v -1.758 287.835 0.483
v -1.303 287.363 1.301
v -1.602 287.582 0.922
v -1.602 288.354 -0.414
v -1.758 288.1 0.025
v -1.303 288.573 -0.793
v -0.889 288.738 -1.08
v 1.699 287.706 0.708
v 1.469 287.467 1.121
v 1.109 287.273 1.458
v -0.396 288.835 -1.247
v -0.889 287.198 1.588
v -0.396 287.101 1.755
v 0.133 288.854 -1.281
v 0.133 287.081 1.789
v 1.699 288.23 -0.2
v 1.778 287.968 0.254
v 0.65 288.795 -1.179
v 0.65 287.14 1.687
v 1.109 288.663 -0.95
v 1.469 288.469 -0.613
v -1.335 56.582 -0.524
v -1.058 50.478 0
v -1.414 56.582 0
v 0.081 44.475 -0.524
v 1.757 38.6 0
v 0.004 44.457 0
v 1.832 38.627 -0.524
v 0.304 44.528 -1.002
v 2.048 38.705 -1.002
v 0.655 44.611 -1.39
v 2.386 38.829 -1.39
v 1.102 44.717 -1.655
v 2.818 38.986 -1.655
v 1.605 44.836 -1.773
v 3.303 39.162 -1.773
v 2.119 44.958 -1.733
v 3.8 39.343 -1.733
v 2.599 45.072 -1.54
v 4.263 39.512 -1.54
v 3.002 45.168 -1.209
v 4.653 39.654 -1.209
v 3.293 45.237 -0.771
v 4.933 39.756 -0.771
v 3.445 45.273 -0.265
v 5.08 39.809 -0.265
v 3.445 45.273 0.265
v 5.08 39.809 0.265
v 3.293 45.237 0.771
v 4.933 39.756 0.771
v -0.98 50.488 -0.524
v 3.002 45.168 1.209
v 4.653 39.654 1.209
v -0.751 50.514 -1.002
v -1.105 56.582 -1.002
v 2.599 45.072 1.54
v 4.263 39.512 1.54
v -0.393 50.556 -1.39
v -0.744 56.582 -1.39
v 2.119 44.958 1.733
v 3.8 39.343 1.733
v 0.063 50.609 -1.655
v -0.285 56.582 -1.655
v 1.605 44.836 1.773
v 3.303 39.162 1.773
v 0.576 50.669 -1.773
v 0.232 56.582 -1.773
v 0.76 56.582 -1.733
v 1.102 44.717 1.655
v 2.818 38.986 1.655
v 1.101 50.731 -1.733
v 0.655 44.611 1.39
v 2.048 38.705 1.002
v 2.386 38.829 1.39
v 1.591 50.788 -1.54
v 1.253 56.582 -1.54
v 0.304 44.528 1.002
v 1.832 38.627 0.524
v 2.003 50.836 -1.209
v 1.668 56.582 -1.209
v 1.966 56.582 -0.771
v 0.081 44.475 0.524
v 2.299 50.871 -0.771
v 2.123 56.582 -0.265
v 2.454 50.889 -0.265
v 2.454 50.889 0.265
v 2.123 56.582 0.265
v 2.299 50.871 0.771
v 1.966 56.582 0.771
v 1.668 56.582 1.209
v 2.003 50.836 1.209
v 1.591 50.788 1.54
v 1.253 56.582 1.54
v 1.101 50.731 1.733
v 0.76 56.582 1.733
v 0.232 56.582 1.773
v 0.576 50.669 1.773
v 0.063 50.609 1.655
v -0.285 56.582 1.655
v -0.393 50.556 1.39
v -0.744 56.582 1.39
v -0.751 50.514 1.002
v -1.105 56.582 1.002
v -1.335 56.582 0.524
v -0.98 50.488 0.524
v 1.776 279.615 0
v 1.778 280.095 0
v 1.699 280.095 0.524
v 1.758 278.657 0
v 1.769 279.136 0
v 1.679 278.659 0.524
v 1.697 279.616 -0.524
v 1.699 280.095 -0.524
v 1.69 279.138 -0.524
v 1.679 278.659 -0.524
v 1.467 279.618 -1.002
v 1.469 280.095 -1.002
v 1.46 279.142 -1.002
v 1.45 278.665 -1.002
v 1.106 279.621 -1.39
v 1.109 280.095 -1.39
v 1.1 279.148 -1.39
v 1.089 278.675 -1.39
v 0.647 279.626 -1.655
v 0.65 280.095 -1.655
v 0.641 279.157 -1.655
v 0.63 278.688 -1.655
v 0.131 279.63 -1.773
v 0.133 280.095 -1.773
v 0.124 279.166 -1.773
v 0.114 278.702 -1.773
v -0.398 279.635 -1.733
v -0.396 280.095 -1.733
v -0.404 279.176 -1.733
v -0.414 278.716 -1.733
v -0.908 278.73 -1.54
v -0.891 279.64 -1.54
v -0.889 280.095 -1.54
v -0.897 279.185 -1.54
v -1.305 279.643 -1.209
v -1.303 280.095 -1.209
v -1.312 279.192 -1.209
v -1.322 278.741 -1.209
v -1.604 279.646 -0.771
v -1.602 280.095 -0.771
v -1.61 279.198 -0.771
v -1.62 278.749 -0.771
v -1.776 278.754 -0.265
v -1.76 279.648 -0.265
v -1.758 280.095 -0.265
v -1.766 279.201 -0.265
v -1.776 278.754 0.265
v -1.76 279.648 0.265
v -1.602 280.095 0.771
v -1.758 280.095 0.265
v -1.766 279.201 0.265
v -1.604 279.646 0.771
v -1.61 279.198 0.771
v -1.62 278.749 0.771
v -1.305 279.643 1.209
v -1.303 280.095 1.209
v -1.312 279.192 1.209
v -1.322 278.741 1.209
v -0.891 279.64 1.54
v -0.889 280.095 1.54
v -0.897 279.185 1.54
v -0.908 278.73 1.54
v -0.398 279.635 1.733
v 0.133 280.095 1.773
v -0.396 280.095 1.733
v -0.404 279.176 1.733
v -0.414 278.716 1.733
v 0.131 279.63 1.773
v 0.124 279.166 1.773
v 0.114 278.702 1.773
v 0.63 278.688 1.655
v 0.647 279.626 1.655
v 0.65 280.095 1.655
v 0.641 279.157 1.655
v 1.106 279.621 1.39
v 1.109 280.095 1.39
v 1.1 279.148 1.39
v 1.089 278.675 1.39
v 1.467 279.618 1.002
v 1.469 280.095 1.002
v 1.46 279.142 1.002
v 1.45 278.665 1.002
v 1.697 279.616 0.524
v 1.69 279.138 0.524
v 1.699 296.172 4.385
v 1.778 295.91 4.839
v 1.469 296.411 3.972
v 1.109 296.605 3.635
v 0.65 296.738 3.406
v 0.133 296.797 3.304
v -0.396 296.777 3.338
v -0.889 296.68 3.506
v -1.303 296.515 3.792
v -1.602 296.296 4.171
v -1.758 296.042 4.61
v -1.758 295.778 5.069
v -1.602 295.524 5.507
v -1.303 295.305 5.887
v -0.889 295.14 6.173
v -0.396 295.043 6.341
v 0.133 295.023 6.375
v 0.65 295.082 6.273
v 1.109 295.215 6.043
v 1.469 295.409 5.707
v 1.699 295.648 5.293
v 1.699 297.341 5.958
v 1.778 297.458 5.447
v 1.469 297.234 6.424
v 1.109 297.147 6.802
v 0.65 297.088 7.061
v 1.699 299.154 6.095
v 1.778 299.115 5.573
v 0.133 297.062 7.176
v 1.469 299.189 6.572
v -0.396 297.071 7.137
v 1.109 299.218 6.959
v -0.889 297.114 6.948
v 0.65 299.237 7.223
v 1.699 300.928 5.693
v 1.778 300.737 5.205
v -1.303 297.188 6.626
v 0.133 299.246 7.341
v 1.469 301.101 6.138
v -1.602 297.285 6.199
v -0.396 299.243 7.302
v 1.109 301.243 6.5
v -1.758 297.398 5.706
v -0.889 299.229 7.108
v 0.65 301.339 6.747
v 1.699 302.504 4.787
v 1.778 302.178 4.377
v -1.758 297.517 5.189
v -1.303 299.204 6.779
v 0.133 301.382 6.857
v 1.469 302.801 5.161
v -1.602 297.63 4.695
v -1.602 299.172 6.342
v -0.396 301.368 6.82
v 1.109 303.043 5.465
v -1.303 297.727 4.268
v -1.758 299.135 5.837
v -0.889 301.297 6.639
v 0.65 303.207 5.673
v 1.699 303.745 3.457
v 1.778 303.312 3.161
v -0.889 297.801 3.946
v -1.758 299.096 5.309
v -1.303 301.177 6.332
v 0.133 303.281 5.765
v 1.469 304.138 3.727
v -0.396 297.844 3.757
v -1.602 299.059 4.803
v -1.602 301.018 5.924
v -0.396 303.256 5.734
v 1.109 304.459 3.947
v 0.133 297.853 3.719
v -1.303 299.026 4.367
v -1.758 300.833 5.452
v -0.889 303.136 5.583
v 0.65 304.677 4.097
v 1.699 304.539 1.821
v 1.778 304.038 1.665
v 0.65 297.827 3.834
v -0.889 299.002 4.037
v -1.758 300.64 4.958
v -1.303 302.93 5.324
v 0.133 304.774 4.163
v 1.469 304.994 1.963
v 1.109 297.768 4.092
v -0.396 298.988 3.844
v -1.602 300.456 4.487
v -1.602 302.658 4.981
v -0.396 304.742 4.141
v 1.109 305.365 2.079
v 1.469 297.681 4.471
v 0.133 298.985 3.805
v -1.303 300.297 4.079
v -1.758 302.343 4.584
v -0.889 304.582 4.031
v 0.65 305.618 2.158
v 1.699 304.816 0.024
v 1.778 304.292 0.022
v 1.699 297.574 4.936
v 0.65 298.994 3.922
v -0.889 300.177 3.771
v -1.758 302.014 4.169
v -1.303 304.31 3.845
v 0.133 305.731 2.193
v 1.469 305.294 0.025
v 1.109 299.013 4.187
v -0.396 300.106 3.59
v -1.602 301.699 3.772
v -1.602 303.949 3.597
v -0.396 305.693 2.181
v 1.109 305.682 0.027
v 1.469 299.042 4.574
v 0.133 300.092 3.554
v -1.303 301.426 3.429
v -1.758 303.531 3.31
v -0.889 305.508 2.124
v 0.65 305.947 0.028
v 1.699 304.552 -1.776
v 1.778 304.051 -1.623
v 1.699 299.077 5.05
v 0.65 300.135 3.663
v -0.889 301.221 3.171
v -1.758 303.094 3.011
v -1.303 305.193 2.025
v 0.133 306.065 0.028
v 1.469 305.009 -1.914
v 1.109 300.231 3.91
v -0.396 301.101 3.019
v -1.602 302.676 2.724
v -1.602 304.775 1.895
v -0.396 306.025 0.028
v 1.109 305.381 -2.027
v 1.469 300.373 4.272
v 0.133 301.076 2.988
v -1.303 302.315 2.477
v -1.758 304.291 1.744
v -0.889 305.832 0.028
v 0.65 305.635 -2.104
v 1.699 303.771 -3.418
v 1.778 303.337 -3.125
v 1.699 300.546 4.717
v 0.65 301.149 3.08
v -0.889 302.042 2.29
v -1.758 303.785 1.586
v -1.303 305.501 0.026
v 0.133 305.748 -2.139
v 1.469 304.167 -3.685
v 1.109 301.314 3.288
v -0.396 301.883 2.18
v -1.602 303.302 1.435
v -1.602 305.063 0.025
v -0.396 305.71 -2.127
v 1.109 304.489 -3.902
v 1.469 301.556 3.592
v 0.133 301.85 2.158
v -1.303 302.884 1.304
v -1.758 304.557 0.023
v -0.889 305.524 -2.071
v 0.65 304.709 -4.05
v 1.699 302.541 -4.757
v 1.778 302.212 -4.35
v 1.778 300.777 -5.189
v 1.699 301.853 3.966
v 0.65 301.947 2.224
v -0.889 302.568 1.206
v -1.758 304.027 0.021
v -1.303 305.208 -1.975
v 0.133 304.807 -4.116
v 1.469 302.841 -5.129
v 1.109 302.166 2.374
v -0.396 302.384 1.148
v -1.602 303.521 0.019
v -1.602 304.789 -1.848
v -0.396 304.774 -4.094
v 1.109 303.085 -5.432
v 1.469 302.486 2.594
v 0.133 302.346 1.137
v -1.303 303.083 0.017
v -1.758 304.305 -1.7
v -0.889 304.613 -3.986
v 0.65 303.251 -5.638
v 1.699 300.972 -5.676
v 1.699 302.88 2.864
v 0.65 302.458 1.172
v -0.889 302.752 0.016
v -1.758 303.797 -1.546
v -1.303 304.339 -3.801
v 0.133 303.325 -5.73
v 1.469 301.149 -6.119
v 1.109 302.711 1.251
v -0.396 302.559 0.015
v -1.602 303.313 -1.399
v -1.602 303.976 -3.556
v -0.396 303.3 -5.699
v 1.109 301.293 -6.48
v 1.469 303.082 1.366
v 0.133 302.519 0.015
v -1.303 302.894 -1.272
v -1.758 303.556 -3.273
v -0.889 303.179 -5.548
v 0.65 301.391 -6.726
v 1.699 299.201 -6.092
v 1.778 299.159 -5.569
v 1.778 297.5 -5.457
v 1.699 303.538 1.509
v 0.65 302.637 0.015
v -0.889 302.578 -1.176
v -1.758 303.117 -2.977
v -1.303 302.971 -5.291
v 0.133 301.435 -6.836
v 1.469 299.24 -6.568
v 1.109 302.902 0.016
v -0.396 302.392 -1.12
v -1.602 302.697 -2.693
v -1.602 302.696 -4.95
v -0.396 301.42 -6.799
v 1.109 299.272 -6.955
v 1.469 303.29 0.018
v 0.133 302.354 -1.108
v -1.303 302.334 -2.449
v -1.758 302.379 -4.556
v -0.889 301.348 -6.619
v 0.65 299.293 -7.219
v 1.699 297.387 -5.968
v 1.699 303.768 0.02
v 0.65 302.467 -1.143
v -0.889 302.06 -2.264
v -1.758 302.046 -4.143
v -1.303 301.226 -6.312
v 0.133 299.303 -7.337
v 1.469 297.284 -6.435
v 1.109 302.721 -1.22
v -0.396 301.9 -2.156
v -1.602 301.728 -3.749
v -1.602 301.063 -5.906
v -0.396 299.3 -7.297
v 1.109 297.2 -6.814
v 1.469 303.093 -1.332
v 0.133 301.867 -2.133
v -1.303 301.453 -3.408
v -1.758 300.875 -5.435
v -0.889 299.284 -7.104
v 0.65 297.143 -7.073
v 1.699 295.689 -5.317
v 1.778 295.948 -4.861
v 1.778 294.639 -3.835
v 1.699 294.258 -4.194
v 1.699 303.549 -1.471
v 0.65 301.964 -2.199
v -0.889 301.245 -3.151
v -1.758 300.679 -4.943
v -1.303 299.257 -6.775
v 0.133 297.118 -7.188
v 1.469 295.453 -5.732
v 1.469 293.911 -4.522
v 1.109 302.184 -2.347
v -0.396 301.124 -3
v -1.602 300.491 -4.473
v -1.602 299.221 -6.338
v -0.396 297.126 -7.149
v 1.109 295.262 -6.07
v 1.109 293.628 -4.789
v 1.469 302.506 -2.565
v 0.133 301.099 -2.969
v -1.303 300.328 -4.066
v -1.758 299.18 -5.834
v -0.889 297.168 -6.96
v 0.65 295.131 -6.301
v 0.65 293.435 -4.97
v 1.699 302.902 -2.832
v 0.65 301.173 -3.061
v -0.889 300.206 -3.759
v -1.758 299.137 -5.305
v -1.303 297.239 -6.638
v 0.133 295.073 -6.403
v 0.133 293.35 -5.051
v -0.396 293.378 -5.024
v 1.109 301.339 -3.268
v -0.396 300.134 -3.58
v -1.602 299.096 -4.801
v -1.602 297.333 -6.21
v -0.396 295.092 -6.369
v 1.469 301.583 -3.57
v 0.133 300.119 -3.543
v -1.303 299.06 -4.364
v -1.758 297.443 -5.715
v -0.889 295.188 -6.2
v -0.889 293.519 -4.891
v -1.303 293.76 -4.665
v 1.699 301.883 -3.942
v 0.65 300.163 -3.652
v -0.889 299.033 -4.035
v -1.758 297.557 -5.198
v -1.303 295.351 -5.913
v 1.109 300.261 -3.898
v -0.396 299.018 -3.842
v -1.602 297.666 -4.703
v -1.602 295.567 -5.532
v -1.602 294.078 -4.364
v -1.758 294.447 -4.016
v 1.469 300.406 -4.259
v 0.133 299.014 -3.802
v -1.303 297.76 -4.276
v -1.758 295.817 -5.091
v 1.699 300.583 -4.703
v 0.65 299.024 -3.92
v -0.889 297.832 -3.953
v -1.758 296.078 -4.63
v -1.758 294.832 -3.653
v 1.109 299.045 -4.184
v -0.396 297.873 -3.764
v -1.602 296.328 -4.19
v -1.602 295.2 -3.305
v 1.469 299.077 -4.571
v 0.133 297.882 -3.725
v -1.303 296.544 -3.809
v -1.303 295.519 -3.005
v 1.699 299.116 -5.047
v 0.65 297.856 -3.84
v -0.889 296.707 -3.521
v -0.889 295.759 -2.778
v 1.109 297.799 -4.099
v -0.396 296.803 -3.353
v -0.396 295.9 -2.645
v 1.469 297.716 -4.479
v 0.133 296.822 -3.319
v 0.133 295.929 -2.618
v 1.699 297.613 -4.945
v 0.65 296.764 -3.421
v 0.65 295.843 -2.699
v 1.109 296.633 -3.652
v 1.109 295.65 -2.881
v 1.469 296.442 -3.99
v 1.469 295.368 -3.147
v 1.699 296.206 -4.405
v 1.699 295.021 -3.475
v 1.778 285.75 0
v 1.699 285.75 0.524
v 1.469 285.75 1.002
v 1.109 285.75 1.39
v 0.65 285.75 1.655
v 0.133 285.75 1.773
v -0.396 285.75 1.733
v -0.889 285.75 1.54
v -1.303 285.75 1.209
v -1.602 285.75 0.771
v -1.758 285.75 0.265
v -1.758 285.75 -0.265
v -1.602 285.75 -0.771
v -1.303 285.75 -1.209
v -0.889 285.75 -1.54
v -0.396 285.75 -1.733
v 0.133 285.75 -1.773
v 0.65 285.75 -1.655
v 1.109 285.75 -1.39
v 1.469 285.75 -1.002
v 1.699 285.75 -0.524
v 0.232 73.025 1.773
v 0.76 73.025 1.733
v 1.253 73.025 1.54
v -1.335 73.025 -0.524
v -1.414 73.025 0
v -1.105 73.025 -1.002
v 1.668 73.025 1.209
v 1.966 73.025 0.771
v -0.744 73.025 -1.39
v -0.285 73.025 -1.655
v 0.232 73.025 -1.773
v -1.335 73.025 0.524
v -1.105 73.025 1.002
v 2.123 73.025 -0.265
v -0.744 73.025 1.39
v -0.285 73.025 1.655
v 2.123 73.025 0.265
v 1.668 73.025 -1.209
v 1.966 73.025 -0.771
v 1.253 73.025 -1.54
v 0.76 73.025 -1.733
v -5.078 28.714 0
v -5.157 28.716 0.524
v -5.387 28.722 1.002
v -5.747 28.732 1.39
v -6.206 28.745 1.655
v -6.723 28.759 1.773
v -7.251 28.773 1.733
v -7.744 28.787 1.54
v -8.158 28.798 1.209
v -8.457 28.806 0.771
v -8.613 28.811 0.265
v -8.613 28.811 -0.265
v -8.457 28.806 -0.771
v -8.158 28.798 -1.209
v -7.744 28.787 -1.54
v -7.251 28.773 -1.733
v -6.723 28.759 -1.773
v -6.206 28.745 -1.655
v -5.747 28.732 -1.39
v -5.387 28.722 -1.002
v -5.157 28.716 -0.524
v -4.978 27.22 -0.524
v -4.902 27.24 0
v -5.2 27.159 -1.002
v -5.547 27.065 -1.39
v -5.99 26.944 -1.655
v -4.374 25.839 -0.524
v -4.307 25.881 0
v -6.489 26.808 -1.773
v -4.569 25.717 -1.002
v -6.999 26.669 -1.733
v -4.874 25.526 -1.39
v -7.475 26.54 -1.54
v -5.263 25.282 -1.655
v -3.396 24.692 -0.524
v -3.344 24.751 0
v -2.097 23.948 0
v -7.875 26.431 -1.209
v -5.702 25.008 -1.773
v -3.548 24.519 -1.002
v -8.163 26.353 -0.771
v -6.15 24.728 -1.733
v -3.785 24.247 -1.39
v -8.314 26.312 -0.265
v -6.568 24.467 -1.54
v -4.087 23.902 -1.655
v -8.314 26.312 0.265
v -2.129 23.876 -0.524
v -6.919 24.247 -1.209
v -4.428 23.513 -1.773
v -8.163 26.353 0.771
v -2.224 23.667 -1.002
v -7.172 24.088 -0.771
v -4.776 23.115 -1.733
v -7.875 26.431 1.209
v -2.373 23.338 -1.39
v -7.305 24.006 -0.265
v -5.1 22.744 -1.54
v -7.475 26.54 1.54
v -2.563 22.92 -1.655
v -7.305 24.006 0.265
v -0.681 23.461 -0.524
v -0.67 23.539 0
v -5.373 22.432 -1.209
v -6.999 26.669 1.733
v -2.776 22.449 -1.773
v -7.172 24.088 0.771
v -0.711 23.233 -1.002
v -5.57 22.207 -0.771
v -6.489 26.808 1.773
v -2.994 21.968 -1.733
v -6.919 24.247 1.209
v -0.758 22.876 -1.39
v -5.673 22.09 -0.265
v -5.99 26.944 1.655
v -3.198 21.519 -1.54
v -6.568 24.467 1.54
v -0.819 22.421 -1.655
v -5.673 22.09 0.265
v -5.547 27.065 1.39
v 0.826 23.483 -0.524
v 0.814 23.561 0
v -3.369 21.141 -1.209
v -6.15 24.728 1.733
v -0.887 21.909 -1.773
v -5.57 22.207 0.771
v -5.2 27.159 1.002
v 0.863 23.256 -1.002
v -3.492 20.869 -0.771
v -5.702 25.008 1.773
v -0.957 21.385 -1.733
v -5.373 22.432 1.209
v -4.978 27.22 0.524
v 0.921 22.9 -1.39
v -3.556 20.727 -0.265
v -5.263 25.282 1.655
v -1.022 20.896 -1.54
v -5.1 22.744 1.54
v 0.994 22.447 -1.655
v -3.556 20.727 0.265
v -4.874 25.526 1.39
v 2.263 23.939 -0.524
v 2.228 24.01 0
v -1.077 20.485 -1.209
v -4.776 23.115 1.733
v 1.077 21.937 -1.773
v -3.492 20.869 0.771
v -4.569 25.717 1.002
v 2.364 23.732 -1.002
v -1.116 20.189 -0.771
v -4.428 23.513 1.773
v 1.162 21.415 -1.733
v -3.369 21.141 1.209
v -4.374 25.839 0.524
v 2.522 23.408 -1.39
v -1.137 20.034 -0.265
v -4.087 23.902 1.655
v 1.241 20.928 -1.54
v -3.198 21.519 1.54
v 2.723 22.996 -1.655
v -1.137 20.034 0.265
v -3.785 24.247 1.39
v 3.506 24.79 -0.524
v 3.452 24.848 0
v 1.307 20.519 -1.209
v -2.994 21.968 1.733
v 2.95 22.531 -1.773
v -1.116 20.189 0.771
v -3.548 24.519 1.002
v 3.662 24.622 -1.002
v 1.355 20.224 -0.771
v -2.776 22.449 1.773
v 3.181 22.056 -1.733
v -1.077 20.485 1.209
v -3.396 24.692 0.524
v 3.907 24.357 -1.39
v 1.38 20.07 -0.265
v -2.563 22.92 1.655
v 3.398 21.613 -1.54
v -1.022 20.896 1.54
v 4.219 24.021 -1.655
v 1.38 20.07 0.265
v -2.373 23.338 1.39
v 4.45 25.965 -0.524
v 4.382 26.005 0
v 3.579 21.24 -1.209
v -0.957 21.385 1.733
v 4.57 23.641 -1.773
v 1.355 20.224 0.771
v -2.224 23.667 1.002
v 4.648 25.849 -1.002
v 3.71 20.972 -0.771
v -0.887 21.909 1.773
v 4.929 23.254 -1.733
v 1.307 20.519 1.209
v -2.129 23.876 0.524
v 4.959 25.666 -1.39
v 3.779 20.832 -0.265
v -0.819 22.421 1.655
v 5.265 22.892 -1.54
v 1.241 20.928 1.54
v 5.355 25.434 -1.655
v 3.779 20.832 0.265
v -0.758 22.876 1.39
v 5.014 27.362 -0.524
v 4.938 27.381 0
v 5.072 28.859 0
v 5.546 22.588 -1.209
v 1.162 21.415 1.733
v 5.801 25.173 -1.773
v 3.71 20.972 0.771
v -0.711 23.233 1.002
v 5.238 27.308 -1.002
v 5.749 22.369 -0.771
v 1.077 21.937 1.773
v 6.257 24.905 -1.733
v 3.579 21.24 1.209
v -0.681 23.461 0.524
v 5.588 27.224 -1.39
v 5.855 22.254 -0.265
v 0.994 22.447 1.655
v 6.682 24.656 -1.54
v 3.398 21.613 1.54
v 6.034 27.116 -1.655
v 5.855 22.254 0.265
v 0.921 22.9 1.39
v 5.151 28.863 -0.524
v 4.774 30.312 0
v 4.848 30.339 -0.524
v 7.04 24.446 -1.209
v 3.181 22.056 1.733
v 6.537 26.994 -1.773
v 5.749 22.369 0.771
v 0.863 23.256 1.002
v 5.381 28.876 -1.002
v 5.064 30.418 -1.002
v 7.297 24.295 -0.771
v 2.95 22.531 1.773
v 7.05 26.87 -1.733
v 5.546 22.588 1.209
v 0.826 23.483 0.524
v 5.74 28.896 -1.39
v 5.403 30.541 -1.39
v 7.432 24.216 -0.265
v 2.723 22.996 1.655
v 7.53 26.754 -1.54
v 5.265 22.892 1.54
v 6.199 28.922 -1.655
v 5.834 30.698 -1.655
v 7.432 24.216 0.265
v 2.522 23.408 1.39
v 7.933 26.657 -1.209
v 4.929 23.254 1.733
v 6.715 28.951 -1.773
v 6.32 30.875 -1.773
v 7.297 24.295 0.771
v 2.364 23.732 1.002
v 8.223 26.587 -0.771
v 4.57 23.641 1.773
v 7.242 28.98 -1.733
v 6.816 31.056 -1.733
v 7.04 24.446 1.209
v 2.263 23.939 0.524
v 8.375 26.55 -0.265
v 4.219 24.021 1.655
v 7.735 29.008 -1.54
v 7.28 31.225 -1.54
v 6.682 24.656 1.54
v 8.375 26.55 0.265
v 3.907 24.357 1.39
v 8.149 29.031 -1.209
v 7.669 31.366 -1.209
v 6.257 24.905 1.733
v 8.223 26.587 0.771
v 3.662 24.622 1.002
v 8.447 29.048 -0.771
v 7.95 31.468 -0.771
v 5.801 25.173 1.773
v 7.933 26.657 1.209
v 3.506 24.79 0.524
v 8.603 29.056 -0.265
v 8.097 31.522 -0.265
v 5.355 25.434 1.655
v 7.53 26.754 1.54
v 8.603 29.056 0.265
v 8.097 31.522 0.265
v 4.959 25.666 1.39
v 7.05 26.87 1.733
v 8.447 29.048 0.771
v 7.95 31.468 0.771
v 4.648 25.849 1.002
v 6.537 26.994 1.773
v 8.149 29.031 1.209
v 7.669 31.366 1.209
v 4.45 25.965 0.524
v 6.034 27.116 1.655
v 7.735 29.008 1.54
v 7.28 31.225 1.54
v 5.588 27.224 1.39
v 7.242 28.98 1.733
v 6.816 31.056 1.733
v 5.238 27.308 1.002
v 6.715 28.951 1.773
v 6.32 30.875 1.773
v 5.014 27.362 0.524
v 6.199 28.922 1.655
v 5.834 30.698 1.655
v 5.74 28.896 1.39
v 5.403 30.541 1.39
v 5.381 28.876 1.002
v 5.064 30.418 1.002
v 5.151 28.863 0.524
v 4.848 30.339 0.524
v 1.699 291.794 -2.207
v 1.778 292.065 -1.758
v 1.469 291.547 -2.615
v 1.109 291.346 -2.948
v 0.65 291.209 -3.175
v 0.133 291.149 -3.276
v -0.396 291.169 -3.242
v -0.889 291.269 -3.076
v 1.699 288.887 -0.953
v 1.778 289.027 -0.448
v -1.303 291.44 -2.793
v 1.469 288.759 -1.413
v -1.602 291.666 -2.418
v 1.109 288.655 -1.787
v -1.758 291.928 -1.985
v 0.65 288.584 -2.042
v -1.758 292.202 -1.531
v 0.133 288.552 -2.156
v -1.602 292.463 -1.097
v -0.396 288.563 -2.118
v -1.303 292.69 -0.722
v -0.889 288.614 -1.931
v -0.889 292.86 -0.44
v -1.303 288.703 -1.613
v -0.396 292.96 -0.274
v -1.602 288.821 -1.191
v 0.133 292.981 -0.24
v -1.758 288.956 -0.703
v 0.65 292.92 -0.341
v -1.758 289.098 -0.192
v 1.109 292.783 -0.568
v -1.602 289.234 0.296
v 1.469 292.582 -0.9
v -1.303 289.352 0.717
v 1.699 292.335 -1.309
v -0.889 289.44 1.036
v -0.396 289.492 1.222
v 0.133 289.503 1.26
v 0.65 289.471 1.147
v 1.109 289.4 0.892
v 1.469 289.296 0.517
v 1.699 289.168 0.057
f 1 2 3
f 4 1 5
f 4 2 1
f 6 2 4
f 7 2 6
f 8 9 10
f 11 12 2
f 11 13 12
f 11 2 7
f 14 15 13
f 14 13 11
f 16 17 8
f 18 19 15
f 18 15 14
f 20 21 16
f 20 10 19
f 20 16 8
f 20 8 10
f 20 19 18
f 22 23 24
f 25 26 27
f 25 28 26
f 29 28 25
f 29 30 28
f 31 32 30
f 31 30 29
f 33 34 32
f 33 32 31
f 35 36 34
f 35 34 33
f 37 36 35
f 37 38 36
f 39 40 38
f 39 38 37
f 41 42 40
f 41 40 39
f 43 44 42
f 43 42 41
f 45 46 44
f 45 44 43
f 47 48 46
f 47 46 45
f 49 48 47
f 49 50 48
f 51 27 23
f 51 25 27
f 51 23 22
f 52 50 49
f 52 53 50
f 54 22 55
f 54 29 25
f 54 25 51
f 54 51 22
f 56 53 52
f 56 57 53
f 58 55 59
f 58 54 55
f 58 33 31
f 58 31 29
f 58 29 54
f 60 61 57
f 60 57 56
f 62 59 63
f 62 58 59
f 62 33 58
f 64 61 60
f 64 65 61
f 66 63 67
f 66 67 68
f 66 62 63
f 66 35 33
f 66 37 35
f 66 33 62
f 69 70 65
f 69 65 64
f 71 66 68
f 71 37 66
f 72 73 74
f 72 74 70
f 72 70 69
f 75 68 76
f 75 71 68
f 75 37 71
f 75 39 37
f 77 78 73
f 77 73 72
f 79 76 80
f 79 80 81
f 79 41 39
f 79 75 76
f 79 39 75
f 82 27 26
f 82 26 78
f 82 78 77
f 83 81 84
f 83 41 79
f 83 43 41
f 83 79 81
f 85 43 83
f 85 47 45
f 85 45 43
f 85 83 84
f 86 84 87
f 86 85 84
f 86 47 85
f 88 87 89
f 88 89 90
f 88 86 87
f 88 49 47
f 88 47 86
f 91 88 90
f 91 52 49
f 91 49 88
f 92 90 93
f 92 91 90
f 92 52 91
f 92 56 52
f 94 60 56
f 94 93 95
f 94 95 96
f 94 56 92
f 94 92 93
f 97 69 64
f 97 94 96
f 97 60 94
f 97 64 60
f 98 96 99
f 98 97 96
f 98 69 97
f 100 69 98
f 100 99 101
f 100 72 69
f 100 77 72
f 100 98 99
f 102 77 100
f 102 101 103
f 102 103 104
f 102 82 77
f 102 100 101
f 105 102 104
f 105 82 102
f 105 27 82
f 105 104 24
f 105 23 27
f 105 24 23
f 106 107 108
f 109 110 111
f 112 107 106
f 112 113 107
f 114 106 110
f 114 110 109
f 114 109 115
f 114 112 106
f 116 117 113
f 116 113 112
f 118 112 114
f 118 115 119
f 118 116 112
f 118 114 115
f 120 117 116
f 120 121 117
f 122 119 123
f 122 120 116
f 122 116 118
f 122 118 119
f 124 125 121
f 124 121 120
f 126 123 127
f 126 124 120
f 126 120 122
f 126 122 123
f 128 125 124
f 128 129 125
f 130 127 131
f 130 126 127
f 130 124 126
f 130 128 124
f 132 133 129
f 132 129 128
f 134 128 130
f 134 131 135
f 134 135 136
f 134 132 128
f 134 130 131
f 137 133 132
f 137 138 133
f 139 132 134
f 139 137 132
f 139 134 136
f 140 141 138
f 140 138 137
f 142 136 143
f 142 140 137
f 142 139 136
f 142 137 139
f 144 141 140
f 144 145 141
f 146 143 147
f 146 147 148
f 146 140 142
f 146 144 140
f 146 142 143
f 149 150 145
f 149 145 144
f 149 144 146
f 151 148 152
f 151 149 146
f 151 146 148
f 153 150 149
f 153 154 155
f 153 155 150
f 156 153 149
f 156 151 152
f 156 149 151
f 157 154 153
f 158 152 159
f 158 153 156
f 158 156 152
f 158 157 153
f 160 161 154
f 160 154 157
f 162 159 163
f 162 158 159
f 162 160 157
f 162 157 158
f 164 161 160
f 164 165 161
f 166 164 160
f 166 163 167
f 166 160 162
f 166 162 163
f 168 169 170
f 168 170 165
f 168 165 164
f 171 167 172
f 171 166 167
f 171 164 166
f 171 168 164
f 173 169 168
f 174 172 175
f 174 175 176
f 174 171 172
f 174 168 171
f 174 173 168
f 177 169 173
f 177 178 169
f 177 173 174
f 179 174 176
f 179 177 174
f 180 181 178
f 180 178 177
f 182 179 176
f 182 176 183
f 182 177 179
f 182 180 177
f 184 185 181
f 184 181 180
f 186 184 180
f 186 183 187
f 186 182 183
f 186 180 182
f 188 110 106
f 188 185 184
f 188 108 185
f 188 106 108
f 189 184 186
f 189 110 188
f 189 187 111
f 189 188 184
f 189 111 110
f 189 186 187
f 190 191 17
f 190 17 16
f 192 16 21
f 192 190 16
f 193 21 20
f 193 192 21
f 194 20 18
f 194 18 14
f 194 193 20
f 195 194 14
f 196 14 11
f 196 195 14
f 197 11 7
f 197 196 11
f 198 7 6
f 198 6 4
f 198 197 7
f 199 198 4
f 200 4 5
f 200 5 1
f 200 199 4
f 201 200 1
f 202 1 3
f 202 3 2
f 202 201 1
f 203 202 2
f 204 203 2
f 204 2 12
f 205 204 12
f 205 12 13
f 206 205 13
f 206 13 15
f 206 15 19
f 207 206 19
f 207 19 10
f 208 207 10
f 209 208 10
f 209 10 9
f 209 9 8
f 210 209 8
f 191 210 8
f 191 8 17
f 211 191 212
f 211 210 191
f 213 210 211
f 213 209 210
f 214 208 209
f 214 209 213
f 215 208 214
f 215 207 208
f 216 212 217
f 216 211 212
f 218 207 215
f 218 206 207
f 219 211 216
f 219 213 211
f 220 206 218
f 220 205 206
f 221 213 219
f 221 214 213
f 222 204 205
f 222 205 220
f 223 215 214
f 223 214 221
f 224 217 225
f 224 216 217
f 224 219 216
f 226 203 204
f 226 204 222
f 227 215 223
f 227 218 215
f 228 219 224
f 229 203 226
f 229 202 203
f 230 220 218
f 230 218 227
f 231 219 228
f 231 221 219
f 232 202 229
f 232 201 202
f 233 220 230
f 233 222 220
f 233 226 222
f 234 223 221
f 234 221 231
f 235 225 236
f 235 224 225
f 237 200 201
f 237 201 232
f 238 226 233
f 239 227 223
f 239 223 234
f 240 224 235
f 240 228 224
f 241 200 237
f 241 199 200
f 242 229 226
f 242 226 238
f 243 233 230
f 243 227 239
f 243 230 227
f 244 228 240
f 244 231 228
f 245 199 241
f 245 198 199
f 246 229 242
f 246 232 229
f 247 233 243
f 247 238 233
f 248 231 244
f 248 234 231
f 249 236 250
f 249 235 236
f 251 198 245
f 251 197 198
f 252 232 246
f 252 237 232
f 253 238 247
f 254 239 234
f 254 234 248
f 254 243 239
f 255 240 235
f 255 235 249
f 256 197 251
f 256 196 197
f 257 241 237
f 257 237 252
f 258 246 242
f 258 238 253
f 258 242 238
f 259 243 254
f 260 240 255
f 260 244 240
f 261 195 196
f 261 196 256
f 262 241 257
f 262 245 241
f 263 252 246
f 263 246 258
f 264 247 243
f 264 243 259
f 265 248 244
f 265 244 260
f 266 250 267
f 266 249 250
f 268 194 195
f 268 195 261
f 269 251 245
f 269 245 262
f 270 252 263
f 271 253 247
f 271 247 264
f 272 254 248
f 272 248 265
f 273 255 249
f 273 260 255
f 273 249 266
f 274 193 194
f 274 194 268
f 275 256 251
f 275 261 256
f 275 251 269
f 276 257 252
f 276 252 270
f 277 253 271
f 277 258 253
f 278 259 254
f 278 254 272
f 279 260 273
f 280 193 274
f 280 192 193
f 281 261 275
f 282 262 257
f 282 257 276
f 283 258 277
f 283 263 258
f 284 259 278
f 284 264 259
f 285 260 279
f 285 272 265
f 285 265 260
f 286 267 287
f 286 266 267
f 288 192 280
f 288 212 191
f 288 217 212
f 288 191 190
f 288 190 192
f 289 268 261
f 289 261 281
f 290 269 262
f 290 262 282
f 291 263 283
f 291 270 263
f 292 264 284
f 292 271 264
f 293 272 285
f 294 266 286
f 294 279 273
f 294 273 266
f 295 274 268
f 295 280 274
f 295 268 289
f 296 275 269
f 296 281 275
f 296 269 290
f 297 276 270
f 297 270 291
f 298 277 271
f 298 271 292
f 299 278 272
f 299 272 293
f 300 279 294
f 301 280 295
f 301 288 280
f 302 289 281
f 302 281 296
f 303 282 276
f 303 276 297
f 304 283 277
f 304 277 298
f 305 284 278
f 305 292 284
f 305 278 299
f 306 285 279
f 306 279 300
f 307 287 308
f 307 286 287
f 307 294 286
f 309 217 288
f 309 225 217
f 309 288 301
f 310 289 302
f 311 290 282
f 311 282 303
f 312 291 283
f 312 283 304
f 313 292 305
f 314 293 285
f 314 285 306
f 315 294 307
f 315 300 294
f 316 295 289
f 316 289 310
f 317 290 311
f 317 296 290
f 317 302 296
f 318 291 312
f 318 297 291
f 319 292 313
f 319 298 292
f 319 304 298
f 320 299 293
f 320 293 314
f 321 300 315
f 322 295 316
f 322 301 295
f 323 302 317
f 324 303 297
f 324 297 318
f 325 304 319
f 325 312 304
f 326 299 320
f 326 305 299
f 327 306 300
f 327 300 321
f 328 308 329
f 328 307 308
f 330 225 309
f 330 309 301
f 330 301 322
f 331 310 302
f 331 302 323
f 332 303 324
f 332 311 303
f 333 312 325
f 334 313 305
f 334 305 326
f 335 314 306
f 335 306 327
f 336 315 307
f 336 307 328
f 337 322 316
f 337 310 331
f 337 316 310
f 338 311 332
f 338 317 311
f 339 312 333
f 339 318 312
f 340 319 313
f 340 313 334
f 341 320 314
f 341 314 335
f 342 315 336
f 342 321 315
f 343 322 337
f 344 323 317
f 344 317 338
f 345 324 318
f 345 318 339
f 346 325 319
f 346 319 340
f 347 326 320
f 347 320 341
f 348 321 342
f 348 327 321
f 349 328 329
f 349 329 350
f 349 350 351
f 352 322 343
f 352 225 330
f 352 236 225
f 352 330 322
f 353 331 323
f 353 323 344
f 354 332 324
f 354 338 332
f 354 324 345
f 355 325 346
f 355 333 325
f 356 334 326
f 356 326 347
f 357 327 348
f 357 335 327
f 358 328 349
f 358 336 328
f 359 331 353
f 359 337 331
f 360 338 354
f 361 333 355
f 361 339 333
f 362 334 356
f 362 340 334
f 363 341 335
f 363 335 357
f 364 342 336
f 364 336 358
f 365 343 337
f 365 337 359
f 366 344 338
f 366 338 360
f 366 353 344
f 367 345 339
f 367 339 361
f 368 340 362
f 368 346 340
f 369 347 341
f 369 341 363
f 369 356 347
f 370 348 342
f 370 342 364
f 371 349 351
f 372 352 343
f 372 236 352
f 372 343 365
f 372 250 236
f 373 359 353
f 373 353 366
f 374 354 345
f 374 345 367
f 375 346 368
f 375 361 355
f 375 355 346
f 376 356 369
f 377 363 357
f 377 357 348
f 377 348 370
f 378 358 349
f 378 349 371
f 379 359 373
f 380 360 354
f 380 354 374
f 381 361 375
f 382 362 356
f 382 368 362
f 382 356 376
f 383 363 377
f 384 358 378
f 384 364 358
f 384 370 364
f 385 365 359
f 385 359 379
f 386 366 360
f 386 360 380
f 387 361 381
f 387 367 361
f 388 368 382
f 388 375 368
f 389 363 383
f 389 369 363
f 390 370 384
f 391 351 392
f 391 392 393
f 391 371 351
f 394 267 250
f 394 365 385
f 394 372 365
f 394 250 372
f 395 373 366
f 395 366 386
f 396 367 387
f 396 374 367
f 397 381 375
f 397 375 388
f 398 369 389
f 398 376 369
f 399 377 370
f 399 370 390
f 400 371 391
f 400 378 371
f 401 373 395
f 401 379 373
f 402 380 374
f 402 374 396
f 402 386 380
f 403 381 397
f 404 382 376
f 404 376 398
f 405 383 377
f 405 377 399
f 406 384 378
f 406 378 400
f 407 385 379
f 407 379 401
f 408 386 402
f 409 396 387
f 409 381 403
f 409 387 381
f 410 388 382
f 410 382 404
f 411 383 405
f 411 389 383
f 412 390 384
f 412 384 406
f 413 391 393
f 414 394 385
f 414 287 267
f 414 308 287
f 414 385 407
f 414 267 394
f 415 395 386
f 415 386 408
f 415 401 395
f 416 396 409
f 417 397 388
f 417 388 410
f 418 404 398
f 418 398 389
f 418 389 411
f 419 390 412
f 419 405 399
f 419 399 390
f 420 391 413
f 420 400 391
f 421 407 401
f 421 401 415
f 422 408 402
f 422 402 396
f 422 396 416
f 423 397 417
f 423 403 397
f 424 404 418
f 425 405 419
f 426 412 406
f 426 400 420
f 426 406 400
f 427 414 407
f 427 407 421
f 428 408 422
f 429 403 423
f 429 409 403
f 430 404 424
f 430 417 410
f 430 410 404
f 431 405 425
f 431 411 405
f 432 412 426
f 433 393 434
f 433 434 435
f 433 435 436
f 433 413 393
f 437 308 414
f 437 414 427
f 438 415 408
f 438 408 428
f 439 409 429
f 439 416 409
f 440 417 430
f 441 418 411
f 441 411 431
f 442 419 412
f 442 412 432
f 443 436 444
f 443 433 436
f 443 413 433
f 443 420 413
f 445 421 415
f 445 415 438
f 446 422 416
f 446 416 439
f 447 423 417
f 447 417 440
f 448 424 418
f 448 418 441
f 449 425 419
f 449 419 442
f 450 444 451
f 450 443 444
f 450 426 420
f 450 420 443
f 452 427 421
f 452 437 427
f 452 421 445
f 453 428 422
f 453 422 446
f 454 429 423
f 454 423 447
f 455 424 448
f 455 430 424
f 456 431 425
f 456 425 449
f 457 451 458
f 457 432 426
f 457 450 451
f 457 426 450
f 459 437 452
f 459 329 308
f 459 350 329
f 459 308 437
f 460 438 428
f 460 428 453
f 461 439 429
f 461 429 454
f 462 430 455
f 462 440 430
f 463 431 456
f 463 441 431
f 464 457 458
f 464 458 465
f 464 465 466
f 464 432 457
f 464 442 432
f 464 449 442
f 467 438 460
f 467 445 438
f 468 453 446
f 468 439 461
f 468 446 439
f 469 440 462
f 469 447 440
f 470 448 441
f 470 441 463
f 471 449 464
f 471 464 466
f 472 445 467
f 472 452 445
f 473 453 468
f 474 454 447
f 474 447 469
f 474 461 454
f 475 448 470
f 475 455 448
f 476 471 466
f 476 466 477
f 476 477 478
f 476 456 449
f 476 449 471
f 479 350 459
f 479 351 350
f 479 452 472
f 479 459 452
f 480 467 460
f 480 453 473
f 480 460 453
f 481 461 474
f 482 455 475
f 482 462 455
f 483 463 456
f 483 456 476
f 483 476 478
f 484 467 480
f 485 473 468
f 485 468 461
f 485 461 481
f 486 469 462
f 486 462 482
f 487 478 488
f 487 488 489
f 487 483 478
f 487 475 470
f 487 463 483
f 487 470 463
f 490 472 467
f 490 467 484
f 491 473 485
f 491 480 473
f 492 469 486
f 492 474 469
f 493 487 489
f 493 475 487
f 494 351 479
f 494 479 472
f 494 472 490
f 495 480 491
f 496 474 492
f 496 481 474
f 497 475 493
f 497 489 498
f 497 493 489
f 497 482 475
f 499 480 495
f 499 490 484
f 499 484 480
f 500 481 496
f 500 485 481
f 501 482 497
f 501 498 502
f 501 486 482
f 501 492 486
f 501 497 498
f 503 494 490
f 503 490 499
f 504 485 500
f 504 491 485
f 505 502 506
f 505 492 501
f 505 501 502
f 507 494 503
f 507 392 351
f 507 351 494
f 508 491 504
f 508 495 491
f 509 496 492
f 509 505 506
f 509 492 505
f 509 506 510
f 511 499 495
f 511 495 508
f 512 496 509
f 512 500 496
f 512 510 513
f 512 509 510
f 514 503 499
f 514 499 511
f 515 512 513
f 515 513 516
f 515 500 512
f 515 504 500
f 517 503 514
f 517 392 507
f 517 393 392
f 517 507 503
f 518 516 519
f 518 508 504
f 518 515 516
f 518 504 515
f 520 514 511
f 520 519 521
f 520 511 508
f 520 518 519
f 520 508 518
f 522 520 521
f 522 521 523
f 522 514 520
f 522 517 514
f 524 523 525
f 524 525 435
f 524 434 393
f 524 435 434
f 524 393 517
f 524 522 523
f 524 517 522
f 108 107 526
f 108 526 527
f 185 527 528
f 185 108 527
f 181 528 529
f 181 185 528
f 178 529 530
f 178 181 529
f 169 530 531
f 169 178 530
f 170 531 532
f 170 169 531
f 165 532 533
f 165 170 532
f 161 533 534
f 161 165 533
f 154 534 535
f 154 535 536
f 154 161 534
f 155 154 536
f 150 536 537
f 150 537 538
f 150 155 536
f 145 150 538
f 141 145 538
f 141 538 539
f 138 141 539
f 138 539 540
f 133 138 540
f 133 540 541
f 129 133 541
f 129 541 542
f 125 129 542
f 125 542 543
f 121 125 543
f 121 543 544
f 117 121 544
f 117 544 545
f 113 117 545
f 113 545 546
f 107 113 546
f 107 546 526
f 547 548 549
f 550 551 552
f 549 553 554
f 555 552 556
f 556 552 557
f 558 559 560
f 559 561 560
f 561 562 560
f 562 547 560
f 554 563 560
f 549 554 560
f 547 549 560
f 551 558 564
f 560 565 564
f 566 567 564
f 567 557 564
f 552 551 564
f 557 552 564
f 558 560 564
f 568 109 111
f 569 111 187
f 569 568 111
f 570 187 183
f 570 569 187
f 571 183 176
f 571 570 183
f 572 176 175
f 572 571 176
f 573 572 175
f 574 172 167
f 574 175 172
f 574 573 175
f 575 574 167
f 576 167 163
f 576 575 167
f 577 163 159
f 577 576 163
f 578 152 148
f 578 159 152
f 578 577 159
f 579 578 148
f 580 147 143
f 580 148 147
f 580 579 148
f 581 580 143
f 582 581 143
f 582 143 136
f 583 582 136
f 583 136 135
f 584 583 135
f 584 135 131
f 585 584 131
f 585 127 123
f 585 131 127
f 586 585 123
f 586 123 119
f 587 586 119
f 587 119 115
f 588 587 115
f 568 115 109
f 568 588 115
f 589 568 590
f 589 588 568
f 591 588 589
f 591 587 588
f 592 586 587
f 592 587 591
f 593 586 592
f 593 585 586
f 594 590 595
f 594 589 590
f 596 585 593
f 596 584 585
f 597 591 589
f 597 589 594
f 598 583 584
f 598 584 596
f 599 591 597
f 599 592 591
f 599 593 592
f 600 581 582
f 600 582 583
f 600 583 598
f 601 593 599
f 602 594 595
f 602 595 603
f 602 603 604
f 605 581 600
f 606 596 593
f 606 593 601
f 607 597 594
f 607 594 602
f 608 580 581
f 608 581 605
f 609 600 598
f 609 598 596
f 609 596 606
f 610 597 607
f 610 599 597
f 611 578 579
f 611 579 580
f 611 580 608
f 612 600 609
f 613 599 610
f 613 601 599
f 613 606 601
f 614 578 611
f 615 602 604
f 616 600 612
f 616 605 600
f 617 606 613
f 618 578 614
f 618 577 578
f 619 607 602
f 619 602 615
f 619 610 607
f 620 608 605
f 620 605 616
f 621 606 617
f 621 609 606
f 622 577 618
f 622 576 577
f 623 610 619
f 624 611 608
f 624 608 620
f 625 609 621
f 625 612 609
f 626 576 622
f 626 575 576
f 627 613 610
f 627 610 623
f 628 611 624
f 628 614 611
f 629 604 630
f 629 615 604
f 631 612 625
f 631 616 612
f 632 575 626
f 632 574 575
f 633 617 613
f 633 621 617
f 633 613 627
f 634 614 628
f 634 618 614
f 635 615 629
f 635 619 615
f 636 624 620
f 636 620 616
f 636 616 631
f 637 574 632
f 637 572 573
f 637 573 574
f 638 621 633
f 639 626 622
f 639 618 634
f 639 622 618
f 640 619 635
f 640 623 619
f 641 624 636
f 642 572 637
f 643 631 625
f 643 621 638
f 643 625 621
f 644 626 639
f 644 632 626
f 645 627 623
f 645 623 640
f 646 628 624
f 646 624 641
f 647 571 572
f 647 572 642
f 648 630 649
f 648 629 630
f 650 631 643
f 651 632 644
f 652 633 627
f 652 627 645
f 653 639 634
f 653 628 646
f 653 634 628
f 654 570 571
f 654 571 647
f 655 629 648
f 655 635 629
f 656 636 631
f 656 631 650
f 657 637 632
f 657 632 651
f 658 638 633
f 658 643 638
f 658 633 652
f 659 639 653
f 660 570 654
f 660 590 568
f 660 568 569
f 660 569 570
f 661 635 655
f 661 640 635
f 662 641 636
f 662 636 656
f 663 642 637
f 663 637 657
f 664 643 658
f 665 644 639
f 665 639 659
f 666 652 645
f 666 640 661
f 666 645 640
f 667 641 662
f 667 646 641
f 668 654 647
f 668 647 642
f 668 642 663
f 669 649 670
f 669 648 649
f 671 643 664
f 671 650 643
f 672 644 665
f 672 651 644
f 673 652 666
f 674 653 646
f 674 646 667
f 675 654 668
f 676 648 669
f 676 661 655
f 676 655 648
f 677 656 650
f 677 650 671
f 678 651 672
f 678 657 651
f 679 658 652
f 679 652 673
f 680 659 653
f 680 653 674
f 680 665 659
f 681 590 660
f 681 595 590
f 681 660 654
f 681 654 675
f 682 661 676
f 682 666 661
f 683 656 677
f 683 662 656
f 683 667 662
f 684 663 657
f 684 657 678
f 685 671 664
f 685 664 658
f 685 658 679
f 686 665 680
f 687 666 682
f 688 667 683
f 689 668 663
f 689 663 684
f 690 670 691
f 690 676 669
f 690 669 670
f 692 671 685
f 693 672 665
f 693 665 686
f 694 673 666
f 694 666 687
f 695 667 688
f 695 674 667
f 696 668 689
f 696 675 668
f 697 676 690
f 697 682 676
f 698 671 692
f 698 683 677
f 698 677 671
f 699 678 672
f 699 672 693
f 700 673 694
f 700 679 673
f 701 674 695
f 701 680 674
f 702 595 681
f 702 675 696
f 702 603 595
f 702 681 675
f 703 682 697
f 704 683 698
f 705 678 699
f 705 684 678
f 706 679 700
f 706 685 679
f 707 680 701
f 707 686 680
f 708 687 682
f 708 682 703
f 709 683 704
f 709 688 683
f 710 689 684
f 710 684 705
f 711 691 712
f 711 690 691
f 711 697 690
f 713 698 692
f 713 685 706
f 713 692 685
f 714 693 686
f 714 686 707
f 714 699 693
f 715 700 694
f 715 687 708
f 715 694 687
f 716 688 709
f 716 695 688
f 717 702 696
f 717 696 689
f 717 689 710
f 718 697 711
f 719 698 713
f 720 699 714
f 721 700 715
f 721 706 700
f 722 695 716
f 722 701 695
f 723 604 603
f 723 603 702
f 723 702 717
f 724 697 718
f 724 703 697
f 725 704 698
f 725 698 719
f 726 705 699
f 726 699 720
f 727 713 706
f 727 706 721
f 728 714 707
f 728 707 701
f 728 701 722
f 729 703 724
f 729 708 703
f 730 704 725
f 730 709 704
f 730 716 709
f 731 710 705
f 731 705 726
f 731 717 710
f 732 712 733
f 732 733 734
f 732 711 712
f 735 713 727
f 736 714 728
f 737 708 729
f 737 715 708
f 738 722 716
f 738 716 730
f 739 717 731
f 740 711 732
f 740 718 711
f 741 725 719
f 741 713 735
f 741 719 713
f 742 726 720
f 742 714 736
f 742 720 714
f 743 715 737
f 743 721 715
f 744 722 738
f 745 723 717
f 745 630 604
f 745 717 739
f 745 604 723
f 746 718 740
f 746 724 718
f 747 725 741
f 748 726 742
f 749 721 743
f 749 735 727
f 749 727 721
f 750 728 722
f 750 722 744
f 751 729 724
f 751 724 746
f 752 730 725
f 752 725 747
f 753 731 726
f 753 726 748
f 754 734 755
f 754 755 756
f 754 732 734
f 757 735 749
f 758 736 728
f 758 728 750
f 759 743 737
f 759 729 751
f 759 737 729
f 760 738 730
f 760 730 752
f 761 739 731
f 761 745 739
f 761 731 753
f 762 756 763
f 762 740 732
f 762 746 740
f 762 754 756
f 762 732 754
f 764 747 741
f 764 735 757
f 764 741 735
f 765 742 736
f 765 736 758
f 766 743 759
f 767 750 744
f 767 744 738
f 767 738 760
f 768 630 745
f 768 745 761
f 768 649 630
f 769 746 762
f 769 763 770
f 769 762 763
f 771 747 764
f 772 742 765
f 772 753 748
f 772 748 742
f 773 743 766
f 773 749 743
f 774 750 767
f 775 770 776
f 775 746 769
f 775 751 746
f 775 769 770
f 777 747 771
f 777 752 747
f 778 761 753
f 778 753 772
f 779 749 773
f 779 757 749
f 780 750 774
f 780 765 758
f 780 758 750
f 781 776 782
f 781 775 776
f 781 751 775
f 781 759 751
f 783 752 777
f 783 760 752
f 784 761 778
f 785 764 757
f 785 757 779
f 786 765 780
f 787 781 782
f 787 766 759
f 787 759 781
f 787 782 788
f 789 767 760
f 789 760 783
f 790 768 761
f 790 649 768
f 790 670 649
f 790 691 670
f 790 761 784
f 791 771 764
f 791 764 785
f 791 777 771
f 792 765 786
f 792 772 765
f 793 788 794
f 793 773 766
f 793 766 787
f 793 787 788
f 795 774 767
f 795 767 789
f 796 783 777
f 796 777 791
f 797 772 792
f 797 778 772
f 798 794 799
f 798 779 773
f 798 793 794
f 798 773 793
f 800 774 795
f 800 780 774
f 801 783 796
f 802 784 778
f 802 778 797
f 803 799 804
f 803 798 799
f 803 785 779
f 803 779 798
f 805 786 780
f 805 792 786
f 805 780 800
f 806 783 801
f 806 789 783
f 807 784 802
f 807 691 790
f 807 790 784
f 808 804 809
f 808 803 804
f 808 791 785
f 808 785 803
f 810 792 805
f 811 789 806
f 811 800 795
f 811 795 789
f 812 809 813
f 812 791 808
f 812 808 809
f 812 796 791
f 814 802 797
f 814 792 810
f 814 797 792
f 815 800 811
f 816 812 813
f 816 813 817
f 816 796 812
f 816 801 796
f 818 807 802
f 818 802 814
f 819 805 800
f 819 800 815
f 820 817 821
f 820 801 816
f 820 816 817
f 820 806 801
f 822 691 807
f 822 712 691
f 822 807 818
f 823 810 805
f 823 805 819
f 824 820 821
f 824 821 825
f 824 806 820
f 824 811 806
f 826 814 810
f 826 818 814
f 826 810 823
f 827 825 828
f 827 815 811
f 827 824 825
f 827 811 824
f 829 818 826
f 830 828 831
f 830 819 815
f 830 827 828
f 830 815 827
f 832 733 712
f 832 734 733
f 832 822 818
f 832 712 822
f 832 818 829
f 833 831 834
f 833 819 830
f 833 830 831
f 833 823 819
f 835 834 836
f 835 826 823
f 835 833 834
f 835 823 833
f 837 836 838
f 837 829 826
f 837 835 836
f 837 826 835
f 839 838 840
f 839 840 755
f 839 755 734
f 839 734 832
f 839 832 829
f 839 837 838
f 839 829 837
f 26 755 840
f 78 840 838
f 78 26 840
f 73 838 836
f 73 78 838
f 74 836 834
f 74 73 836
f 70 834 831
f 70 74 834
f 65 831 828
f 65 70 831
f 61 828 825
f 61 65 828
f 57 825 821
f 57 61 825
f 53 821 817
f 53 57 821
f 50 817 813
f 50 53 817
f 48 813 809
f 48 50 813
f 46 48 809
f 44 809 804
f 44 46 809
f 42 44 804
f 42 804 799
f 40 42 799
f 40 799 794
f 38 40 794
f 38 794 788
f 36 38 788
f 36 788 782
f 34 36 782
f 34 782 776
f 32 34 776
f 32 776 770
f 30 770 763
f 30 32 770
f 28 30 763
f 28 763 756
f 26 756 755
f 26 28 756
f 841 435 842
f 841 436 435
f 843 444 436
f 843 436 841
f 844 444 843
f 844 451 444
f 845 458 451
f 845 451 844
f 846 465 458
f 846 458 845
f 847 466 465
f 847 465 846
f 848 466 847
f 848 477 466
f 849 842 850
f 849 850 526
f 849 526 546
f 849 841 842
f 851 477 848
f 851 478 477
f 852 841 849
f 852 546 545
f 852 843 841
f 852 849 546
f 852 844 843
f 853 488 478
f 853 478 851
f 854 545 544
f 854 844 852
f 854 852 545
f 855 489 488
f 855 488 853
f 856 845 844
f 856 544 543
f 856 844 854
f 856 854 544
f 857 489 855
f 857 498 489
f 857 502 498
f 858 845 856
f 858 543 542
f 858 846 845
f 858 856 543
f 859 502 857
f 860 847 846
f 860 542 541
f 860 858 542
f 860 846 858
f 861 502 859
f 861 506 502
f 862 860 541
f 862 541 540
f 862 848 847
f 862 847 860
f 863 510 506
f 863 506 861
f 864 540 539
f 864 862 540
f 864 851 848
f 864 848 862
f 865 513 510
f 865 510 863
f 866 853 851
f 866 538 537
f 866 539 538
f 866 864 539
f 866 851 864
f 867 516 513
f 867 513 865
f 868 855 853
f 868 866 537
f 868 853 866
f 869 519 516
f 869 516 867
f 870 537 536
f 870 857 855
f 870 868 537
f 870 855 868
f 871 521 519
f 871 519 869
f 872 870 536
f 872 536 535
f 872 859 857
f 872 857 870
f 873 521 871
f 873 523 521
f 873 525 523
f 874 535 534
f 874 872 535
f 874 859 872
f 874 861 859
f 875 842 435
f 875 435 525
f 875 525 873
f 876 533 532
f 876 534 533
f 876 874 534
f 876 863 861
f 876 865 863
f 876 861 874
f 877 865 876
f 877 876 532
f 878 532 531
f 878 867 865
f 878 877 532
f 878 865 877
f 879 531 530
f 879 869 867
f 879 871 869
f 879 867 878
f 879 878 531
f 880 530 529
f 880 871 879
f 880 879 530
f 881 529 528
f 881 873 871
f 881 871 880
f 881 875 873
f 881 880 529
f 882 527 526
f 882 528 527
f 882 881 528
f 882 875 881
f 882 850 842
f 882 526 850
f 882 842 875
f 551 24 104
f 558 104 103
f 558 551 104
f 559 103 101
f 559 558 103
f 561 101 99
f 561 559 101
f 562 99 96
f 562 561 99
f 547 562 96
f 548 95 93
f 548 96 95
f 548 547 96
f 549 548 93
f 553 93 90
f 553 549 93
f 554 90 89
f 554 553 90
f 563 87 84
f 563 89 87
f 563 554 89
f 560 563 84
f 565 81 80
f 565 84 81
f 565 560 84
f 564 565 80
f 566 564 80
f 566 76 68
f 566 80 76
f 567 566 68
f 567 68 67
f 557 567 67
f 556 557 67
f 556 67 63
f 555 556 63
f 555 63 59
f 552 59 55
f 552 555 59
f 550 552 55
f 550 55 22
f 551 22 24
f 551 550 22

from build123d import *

# Parameters (mm, degrees)
SKETCH2_R = 1.778
SKETCH4_R = 1.778


with BuildPart() as part:
    # Sweep1: sweep along a path in Sketch1
    with BuildLine(Plane.XY) as sweep1_path:
        Line((0, 285.75), (0, 280.094610855))
        ThreePointArc((0, 280.094610855), (-0.004748195, 279.400064924), (-0.018991892, 278.70564883))
        Line((-0.018991892, 278.70564883), (-6.855436095, 28.762509873))
        ThreePointArc((-6.855436095, 28.762509873), (1.098428674, 21.805537802), (6.444411993, 30.920574143))
        Line((6.444411993, 30.920574143), (3.428113065, 39.207787339))
        ThreePointArc((3.428113065, 39.207787339), (1.136264348, 47.761083195), (0.364498201, 56.58241062))
        Line((0.364498201, 56.58241062), (0.364498201, 73.025))
    # Sketch2 → Sweep1 (sweep)
    with BuildSketch(Plane(origin=(0, 285.75, 0), x_dir=(1, 0, 0), z_dir=(0, 1, 0))):
        Circle(SKETCH2_R)
    sweep(path=sweep1_path.line)

    # Sweep2: sweep along a path in Sketch3
    with BuildLine(Plane(origin=(0, 0, 0), x_dir=(0, 0, -1), z_dir=(1, 0, 0))) as sweep2_path:
        Line((-0.254, 287.967940905), (-4.839349956, 295.91))
        ThreePointArc((-4.839349956, 295.91), (0.809947546, 304.232989869), (3.834617828, 294.639341329))
        ThreePointArc((3.834617828, 294.639341329), (0.999529614, 290.59057546), (0, 285.75))
    # Sketch4 → Sweep2 (sweep)
    with BuildSketch(Plane(origin=(0, 285.75, 0), x_dir=(1, 0, 0), z_dir=(0, 1, 0))):
        Circle(SKETCH4_R)
    sweep(path=sweep2_path.line)


solid = part.part
